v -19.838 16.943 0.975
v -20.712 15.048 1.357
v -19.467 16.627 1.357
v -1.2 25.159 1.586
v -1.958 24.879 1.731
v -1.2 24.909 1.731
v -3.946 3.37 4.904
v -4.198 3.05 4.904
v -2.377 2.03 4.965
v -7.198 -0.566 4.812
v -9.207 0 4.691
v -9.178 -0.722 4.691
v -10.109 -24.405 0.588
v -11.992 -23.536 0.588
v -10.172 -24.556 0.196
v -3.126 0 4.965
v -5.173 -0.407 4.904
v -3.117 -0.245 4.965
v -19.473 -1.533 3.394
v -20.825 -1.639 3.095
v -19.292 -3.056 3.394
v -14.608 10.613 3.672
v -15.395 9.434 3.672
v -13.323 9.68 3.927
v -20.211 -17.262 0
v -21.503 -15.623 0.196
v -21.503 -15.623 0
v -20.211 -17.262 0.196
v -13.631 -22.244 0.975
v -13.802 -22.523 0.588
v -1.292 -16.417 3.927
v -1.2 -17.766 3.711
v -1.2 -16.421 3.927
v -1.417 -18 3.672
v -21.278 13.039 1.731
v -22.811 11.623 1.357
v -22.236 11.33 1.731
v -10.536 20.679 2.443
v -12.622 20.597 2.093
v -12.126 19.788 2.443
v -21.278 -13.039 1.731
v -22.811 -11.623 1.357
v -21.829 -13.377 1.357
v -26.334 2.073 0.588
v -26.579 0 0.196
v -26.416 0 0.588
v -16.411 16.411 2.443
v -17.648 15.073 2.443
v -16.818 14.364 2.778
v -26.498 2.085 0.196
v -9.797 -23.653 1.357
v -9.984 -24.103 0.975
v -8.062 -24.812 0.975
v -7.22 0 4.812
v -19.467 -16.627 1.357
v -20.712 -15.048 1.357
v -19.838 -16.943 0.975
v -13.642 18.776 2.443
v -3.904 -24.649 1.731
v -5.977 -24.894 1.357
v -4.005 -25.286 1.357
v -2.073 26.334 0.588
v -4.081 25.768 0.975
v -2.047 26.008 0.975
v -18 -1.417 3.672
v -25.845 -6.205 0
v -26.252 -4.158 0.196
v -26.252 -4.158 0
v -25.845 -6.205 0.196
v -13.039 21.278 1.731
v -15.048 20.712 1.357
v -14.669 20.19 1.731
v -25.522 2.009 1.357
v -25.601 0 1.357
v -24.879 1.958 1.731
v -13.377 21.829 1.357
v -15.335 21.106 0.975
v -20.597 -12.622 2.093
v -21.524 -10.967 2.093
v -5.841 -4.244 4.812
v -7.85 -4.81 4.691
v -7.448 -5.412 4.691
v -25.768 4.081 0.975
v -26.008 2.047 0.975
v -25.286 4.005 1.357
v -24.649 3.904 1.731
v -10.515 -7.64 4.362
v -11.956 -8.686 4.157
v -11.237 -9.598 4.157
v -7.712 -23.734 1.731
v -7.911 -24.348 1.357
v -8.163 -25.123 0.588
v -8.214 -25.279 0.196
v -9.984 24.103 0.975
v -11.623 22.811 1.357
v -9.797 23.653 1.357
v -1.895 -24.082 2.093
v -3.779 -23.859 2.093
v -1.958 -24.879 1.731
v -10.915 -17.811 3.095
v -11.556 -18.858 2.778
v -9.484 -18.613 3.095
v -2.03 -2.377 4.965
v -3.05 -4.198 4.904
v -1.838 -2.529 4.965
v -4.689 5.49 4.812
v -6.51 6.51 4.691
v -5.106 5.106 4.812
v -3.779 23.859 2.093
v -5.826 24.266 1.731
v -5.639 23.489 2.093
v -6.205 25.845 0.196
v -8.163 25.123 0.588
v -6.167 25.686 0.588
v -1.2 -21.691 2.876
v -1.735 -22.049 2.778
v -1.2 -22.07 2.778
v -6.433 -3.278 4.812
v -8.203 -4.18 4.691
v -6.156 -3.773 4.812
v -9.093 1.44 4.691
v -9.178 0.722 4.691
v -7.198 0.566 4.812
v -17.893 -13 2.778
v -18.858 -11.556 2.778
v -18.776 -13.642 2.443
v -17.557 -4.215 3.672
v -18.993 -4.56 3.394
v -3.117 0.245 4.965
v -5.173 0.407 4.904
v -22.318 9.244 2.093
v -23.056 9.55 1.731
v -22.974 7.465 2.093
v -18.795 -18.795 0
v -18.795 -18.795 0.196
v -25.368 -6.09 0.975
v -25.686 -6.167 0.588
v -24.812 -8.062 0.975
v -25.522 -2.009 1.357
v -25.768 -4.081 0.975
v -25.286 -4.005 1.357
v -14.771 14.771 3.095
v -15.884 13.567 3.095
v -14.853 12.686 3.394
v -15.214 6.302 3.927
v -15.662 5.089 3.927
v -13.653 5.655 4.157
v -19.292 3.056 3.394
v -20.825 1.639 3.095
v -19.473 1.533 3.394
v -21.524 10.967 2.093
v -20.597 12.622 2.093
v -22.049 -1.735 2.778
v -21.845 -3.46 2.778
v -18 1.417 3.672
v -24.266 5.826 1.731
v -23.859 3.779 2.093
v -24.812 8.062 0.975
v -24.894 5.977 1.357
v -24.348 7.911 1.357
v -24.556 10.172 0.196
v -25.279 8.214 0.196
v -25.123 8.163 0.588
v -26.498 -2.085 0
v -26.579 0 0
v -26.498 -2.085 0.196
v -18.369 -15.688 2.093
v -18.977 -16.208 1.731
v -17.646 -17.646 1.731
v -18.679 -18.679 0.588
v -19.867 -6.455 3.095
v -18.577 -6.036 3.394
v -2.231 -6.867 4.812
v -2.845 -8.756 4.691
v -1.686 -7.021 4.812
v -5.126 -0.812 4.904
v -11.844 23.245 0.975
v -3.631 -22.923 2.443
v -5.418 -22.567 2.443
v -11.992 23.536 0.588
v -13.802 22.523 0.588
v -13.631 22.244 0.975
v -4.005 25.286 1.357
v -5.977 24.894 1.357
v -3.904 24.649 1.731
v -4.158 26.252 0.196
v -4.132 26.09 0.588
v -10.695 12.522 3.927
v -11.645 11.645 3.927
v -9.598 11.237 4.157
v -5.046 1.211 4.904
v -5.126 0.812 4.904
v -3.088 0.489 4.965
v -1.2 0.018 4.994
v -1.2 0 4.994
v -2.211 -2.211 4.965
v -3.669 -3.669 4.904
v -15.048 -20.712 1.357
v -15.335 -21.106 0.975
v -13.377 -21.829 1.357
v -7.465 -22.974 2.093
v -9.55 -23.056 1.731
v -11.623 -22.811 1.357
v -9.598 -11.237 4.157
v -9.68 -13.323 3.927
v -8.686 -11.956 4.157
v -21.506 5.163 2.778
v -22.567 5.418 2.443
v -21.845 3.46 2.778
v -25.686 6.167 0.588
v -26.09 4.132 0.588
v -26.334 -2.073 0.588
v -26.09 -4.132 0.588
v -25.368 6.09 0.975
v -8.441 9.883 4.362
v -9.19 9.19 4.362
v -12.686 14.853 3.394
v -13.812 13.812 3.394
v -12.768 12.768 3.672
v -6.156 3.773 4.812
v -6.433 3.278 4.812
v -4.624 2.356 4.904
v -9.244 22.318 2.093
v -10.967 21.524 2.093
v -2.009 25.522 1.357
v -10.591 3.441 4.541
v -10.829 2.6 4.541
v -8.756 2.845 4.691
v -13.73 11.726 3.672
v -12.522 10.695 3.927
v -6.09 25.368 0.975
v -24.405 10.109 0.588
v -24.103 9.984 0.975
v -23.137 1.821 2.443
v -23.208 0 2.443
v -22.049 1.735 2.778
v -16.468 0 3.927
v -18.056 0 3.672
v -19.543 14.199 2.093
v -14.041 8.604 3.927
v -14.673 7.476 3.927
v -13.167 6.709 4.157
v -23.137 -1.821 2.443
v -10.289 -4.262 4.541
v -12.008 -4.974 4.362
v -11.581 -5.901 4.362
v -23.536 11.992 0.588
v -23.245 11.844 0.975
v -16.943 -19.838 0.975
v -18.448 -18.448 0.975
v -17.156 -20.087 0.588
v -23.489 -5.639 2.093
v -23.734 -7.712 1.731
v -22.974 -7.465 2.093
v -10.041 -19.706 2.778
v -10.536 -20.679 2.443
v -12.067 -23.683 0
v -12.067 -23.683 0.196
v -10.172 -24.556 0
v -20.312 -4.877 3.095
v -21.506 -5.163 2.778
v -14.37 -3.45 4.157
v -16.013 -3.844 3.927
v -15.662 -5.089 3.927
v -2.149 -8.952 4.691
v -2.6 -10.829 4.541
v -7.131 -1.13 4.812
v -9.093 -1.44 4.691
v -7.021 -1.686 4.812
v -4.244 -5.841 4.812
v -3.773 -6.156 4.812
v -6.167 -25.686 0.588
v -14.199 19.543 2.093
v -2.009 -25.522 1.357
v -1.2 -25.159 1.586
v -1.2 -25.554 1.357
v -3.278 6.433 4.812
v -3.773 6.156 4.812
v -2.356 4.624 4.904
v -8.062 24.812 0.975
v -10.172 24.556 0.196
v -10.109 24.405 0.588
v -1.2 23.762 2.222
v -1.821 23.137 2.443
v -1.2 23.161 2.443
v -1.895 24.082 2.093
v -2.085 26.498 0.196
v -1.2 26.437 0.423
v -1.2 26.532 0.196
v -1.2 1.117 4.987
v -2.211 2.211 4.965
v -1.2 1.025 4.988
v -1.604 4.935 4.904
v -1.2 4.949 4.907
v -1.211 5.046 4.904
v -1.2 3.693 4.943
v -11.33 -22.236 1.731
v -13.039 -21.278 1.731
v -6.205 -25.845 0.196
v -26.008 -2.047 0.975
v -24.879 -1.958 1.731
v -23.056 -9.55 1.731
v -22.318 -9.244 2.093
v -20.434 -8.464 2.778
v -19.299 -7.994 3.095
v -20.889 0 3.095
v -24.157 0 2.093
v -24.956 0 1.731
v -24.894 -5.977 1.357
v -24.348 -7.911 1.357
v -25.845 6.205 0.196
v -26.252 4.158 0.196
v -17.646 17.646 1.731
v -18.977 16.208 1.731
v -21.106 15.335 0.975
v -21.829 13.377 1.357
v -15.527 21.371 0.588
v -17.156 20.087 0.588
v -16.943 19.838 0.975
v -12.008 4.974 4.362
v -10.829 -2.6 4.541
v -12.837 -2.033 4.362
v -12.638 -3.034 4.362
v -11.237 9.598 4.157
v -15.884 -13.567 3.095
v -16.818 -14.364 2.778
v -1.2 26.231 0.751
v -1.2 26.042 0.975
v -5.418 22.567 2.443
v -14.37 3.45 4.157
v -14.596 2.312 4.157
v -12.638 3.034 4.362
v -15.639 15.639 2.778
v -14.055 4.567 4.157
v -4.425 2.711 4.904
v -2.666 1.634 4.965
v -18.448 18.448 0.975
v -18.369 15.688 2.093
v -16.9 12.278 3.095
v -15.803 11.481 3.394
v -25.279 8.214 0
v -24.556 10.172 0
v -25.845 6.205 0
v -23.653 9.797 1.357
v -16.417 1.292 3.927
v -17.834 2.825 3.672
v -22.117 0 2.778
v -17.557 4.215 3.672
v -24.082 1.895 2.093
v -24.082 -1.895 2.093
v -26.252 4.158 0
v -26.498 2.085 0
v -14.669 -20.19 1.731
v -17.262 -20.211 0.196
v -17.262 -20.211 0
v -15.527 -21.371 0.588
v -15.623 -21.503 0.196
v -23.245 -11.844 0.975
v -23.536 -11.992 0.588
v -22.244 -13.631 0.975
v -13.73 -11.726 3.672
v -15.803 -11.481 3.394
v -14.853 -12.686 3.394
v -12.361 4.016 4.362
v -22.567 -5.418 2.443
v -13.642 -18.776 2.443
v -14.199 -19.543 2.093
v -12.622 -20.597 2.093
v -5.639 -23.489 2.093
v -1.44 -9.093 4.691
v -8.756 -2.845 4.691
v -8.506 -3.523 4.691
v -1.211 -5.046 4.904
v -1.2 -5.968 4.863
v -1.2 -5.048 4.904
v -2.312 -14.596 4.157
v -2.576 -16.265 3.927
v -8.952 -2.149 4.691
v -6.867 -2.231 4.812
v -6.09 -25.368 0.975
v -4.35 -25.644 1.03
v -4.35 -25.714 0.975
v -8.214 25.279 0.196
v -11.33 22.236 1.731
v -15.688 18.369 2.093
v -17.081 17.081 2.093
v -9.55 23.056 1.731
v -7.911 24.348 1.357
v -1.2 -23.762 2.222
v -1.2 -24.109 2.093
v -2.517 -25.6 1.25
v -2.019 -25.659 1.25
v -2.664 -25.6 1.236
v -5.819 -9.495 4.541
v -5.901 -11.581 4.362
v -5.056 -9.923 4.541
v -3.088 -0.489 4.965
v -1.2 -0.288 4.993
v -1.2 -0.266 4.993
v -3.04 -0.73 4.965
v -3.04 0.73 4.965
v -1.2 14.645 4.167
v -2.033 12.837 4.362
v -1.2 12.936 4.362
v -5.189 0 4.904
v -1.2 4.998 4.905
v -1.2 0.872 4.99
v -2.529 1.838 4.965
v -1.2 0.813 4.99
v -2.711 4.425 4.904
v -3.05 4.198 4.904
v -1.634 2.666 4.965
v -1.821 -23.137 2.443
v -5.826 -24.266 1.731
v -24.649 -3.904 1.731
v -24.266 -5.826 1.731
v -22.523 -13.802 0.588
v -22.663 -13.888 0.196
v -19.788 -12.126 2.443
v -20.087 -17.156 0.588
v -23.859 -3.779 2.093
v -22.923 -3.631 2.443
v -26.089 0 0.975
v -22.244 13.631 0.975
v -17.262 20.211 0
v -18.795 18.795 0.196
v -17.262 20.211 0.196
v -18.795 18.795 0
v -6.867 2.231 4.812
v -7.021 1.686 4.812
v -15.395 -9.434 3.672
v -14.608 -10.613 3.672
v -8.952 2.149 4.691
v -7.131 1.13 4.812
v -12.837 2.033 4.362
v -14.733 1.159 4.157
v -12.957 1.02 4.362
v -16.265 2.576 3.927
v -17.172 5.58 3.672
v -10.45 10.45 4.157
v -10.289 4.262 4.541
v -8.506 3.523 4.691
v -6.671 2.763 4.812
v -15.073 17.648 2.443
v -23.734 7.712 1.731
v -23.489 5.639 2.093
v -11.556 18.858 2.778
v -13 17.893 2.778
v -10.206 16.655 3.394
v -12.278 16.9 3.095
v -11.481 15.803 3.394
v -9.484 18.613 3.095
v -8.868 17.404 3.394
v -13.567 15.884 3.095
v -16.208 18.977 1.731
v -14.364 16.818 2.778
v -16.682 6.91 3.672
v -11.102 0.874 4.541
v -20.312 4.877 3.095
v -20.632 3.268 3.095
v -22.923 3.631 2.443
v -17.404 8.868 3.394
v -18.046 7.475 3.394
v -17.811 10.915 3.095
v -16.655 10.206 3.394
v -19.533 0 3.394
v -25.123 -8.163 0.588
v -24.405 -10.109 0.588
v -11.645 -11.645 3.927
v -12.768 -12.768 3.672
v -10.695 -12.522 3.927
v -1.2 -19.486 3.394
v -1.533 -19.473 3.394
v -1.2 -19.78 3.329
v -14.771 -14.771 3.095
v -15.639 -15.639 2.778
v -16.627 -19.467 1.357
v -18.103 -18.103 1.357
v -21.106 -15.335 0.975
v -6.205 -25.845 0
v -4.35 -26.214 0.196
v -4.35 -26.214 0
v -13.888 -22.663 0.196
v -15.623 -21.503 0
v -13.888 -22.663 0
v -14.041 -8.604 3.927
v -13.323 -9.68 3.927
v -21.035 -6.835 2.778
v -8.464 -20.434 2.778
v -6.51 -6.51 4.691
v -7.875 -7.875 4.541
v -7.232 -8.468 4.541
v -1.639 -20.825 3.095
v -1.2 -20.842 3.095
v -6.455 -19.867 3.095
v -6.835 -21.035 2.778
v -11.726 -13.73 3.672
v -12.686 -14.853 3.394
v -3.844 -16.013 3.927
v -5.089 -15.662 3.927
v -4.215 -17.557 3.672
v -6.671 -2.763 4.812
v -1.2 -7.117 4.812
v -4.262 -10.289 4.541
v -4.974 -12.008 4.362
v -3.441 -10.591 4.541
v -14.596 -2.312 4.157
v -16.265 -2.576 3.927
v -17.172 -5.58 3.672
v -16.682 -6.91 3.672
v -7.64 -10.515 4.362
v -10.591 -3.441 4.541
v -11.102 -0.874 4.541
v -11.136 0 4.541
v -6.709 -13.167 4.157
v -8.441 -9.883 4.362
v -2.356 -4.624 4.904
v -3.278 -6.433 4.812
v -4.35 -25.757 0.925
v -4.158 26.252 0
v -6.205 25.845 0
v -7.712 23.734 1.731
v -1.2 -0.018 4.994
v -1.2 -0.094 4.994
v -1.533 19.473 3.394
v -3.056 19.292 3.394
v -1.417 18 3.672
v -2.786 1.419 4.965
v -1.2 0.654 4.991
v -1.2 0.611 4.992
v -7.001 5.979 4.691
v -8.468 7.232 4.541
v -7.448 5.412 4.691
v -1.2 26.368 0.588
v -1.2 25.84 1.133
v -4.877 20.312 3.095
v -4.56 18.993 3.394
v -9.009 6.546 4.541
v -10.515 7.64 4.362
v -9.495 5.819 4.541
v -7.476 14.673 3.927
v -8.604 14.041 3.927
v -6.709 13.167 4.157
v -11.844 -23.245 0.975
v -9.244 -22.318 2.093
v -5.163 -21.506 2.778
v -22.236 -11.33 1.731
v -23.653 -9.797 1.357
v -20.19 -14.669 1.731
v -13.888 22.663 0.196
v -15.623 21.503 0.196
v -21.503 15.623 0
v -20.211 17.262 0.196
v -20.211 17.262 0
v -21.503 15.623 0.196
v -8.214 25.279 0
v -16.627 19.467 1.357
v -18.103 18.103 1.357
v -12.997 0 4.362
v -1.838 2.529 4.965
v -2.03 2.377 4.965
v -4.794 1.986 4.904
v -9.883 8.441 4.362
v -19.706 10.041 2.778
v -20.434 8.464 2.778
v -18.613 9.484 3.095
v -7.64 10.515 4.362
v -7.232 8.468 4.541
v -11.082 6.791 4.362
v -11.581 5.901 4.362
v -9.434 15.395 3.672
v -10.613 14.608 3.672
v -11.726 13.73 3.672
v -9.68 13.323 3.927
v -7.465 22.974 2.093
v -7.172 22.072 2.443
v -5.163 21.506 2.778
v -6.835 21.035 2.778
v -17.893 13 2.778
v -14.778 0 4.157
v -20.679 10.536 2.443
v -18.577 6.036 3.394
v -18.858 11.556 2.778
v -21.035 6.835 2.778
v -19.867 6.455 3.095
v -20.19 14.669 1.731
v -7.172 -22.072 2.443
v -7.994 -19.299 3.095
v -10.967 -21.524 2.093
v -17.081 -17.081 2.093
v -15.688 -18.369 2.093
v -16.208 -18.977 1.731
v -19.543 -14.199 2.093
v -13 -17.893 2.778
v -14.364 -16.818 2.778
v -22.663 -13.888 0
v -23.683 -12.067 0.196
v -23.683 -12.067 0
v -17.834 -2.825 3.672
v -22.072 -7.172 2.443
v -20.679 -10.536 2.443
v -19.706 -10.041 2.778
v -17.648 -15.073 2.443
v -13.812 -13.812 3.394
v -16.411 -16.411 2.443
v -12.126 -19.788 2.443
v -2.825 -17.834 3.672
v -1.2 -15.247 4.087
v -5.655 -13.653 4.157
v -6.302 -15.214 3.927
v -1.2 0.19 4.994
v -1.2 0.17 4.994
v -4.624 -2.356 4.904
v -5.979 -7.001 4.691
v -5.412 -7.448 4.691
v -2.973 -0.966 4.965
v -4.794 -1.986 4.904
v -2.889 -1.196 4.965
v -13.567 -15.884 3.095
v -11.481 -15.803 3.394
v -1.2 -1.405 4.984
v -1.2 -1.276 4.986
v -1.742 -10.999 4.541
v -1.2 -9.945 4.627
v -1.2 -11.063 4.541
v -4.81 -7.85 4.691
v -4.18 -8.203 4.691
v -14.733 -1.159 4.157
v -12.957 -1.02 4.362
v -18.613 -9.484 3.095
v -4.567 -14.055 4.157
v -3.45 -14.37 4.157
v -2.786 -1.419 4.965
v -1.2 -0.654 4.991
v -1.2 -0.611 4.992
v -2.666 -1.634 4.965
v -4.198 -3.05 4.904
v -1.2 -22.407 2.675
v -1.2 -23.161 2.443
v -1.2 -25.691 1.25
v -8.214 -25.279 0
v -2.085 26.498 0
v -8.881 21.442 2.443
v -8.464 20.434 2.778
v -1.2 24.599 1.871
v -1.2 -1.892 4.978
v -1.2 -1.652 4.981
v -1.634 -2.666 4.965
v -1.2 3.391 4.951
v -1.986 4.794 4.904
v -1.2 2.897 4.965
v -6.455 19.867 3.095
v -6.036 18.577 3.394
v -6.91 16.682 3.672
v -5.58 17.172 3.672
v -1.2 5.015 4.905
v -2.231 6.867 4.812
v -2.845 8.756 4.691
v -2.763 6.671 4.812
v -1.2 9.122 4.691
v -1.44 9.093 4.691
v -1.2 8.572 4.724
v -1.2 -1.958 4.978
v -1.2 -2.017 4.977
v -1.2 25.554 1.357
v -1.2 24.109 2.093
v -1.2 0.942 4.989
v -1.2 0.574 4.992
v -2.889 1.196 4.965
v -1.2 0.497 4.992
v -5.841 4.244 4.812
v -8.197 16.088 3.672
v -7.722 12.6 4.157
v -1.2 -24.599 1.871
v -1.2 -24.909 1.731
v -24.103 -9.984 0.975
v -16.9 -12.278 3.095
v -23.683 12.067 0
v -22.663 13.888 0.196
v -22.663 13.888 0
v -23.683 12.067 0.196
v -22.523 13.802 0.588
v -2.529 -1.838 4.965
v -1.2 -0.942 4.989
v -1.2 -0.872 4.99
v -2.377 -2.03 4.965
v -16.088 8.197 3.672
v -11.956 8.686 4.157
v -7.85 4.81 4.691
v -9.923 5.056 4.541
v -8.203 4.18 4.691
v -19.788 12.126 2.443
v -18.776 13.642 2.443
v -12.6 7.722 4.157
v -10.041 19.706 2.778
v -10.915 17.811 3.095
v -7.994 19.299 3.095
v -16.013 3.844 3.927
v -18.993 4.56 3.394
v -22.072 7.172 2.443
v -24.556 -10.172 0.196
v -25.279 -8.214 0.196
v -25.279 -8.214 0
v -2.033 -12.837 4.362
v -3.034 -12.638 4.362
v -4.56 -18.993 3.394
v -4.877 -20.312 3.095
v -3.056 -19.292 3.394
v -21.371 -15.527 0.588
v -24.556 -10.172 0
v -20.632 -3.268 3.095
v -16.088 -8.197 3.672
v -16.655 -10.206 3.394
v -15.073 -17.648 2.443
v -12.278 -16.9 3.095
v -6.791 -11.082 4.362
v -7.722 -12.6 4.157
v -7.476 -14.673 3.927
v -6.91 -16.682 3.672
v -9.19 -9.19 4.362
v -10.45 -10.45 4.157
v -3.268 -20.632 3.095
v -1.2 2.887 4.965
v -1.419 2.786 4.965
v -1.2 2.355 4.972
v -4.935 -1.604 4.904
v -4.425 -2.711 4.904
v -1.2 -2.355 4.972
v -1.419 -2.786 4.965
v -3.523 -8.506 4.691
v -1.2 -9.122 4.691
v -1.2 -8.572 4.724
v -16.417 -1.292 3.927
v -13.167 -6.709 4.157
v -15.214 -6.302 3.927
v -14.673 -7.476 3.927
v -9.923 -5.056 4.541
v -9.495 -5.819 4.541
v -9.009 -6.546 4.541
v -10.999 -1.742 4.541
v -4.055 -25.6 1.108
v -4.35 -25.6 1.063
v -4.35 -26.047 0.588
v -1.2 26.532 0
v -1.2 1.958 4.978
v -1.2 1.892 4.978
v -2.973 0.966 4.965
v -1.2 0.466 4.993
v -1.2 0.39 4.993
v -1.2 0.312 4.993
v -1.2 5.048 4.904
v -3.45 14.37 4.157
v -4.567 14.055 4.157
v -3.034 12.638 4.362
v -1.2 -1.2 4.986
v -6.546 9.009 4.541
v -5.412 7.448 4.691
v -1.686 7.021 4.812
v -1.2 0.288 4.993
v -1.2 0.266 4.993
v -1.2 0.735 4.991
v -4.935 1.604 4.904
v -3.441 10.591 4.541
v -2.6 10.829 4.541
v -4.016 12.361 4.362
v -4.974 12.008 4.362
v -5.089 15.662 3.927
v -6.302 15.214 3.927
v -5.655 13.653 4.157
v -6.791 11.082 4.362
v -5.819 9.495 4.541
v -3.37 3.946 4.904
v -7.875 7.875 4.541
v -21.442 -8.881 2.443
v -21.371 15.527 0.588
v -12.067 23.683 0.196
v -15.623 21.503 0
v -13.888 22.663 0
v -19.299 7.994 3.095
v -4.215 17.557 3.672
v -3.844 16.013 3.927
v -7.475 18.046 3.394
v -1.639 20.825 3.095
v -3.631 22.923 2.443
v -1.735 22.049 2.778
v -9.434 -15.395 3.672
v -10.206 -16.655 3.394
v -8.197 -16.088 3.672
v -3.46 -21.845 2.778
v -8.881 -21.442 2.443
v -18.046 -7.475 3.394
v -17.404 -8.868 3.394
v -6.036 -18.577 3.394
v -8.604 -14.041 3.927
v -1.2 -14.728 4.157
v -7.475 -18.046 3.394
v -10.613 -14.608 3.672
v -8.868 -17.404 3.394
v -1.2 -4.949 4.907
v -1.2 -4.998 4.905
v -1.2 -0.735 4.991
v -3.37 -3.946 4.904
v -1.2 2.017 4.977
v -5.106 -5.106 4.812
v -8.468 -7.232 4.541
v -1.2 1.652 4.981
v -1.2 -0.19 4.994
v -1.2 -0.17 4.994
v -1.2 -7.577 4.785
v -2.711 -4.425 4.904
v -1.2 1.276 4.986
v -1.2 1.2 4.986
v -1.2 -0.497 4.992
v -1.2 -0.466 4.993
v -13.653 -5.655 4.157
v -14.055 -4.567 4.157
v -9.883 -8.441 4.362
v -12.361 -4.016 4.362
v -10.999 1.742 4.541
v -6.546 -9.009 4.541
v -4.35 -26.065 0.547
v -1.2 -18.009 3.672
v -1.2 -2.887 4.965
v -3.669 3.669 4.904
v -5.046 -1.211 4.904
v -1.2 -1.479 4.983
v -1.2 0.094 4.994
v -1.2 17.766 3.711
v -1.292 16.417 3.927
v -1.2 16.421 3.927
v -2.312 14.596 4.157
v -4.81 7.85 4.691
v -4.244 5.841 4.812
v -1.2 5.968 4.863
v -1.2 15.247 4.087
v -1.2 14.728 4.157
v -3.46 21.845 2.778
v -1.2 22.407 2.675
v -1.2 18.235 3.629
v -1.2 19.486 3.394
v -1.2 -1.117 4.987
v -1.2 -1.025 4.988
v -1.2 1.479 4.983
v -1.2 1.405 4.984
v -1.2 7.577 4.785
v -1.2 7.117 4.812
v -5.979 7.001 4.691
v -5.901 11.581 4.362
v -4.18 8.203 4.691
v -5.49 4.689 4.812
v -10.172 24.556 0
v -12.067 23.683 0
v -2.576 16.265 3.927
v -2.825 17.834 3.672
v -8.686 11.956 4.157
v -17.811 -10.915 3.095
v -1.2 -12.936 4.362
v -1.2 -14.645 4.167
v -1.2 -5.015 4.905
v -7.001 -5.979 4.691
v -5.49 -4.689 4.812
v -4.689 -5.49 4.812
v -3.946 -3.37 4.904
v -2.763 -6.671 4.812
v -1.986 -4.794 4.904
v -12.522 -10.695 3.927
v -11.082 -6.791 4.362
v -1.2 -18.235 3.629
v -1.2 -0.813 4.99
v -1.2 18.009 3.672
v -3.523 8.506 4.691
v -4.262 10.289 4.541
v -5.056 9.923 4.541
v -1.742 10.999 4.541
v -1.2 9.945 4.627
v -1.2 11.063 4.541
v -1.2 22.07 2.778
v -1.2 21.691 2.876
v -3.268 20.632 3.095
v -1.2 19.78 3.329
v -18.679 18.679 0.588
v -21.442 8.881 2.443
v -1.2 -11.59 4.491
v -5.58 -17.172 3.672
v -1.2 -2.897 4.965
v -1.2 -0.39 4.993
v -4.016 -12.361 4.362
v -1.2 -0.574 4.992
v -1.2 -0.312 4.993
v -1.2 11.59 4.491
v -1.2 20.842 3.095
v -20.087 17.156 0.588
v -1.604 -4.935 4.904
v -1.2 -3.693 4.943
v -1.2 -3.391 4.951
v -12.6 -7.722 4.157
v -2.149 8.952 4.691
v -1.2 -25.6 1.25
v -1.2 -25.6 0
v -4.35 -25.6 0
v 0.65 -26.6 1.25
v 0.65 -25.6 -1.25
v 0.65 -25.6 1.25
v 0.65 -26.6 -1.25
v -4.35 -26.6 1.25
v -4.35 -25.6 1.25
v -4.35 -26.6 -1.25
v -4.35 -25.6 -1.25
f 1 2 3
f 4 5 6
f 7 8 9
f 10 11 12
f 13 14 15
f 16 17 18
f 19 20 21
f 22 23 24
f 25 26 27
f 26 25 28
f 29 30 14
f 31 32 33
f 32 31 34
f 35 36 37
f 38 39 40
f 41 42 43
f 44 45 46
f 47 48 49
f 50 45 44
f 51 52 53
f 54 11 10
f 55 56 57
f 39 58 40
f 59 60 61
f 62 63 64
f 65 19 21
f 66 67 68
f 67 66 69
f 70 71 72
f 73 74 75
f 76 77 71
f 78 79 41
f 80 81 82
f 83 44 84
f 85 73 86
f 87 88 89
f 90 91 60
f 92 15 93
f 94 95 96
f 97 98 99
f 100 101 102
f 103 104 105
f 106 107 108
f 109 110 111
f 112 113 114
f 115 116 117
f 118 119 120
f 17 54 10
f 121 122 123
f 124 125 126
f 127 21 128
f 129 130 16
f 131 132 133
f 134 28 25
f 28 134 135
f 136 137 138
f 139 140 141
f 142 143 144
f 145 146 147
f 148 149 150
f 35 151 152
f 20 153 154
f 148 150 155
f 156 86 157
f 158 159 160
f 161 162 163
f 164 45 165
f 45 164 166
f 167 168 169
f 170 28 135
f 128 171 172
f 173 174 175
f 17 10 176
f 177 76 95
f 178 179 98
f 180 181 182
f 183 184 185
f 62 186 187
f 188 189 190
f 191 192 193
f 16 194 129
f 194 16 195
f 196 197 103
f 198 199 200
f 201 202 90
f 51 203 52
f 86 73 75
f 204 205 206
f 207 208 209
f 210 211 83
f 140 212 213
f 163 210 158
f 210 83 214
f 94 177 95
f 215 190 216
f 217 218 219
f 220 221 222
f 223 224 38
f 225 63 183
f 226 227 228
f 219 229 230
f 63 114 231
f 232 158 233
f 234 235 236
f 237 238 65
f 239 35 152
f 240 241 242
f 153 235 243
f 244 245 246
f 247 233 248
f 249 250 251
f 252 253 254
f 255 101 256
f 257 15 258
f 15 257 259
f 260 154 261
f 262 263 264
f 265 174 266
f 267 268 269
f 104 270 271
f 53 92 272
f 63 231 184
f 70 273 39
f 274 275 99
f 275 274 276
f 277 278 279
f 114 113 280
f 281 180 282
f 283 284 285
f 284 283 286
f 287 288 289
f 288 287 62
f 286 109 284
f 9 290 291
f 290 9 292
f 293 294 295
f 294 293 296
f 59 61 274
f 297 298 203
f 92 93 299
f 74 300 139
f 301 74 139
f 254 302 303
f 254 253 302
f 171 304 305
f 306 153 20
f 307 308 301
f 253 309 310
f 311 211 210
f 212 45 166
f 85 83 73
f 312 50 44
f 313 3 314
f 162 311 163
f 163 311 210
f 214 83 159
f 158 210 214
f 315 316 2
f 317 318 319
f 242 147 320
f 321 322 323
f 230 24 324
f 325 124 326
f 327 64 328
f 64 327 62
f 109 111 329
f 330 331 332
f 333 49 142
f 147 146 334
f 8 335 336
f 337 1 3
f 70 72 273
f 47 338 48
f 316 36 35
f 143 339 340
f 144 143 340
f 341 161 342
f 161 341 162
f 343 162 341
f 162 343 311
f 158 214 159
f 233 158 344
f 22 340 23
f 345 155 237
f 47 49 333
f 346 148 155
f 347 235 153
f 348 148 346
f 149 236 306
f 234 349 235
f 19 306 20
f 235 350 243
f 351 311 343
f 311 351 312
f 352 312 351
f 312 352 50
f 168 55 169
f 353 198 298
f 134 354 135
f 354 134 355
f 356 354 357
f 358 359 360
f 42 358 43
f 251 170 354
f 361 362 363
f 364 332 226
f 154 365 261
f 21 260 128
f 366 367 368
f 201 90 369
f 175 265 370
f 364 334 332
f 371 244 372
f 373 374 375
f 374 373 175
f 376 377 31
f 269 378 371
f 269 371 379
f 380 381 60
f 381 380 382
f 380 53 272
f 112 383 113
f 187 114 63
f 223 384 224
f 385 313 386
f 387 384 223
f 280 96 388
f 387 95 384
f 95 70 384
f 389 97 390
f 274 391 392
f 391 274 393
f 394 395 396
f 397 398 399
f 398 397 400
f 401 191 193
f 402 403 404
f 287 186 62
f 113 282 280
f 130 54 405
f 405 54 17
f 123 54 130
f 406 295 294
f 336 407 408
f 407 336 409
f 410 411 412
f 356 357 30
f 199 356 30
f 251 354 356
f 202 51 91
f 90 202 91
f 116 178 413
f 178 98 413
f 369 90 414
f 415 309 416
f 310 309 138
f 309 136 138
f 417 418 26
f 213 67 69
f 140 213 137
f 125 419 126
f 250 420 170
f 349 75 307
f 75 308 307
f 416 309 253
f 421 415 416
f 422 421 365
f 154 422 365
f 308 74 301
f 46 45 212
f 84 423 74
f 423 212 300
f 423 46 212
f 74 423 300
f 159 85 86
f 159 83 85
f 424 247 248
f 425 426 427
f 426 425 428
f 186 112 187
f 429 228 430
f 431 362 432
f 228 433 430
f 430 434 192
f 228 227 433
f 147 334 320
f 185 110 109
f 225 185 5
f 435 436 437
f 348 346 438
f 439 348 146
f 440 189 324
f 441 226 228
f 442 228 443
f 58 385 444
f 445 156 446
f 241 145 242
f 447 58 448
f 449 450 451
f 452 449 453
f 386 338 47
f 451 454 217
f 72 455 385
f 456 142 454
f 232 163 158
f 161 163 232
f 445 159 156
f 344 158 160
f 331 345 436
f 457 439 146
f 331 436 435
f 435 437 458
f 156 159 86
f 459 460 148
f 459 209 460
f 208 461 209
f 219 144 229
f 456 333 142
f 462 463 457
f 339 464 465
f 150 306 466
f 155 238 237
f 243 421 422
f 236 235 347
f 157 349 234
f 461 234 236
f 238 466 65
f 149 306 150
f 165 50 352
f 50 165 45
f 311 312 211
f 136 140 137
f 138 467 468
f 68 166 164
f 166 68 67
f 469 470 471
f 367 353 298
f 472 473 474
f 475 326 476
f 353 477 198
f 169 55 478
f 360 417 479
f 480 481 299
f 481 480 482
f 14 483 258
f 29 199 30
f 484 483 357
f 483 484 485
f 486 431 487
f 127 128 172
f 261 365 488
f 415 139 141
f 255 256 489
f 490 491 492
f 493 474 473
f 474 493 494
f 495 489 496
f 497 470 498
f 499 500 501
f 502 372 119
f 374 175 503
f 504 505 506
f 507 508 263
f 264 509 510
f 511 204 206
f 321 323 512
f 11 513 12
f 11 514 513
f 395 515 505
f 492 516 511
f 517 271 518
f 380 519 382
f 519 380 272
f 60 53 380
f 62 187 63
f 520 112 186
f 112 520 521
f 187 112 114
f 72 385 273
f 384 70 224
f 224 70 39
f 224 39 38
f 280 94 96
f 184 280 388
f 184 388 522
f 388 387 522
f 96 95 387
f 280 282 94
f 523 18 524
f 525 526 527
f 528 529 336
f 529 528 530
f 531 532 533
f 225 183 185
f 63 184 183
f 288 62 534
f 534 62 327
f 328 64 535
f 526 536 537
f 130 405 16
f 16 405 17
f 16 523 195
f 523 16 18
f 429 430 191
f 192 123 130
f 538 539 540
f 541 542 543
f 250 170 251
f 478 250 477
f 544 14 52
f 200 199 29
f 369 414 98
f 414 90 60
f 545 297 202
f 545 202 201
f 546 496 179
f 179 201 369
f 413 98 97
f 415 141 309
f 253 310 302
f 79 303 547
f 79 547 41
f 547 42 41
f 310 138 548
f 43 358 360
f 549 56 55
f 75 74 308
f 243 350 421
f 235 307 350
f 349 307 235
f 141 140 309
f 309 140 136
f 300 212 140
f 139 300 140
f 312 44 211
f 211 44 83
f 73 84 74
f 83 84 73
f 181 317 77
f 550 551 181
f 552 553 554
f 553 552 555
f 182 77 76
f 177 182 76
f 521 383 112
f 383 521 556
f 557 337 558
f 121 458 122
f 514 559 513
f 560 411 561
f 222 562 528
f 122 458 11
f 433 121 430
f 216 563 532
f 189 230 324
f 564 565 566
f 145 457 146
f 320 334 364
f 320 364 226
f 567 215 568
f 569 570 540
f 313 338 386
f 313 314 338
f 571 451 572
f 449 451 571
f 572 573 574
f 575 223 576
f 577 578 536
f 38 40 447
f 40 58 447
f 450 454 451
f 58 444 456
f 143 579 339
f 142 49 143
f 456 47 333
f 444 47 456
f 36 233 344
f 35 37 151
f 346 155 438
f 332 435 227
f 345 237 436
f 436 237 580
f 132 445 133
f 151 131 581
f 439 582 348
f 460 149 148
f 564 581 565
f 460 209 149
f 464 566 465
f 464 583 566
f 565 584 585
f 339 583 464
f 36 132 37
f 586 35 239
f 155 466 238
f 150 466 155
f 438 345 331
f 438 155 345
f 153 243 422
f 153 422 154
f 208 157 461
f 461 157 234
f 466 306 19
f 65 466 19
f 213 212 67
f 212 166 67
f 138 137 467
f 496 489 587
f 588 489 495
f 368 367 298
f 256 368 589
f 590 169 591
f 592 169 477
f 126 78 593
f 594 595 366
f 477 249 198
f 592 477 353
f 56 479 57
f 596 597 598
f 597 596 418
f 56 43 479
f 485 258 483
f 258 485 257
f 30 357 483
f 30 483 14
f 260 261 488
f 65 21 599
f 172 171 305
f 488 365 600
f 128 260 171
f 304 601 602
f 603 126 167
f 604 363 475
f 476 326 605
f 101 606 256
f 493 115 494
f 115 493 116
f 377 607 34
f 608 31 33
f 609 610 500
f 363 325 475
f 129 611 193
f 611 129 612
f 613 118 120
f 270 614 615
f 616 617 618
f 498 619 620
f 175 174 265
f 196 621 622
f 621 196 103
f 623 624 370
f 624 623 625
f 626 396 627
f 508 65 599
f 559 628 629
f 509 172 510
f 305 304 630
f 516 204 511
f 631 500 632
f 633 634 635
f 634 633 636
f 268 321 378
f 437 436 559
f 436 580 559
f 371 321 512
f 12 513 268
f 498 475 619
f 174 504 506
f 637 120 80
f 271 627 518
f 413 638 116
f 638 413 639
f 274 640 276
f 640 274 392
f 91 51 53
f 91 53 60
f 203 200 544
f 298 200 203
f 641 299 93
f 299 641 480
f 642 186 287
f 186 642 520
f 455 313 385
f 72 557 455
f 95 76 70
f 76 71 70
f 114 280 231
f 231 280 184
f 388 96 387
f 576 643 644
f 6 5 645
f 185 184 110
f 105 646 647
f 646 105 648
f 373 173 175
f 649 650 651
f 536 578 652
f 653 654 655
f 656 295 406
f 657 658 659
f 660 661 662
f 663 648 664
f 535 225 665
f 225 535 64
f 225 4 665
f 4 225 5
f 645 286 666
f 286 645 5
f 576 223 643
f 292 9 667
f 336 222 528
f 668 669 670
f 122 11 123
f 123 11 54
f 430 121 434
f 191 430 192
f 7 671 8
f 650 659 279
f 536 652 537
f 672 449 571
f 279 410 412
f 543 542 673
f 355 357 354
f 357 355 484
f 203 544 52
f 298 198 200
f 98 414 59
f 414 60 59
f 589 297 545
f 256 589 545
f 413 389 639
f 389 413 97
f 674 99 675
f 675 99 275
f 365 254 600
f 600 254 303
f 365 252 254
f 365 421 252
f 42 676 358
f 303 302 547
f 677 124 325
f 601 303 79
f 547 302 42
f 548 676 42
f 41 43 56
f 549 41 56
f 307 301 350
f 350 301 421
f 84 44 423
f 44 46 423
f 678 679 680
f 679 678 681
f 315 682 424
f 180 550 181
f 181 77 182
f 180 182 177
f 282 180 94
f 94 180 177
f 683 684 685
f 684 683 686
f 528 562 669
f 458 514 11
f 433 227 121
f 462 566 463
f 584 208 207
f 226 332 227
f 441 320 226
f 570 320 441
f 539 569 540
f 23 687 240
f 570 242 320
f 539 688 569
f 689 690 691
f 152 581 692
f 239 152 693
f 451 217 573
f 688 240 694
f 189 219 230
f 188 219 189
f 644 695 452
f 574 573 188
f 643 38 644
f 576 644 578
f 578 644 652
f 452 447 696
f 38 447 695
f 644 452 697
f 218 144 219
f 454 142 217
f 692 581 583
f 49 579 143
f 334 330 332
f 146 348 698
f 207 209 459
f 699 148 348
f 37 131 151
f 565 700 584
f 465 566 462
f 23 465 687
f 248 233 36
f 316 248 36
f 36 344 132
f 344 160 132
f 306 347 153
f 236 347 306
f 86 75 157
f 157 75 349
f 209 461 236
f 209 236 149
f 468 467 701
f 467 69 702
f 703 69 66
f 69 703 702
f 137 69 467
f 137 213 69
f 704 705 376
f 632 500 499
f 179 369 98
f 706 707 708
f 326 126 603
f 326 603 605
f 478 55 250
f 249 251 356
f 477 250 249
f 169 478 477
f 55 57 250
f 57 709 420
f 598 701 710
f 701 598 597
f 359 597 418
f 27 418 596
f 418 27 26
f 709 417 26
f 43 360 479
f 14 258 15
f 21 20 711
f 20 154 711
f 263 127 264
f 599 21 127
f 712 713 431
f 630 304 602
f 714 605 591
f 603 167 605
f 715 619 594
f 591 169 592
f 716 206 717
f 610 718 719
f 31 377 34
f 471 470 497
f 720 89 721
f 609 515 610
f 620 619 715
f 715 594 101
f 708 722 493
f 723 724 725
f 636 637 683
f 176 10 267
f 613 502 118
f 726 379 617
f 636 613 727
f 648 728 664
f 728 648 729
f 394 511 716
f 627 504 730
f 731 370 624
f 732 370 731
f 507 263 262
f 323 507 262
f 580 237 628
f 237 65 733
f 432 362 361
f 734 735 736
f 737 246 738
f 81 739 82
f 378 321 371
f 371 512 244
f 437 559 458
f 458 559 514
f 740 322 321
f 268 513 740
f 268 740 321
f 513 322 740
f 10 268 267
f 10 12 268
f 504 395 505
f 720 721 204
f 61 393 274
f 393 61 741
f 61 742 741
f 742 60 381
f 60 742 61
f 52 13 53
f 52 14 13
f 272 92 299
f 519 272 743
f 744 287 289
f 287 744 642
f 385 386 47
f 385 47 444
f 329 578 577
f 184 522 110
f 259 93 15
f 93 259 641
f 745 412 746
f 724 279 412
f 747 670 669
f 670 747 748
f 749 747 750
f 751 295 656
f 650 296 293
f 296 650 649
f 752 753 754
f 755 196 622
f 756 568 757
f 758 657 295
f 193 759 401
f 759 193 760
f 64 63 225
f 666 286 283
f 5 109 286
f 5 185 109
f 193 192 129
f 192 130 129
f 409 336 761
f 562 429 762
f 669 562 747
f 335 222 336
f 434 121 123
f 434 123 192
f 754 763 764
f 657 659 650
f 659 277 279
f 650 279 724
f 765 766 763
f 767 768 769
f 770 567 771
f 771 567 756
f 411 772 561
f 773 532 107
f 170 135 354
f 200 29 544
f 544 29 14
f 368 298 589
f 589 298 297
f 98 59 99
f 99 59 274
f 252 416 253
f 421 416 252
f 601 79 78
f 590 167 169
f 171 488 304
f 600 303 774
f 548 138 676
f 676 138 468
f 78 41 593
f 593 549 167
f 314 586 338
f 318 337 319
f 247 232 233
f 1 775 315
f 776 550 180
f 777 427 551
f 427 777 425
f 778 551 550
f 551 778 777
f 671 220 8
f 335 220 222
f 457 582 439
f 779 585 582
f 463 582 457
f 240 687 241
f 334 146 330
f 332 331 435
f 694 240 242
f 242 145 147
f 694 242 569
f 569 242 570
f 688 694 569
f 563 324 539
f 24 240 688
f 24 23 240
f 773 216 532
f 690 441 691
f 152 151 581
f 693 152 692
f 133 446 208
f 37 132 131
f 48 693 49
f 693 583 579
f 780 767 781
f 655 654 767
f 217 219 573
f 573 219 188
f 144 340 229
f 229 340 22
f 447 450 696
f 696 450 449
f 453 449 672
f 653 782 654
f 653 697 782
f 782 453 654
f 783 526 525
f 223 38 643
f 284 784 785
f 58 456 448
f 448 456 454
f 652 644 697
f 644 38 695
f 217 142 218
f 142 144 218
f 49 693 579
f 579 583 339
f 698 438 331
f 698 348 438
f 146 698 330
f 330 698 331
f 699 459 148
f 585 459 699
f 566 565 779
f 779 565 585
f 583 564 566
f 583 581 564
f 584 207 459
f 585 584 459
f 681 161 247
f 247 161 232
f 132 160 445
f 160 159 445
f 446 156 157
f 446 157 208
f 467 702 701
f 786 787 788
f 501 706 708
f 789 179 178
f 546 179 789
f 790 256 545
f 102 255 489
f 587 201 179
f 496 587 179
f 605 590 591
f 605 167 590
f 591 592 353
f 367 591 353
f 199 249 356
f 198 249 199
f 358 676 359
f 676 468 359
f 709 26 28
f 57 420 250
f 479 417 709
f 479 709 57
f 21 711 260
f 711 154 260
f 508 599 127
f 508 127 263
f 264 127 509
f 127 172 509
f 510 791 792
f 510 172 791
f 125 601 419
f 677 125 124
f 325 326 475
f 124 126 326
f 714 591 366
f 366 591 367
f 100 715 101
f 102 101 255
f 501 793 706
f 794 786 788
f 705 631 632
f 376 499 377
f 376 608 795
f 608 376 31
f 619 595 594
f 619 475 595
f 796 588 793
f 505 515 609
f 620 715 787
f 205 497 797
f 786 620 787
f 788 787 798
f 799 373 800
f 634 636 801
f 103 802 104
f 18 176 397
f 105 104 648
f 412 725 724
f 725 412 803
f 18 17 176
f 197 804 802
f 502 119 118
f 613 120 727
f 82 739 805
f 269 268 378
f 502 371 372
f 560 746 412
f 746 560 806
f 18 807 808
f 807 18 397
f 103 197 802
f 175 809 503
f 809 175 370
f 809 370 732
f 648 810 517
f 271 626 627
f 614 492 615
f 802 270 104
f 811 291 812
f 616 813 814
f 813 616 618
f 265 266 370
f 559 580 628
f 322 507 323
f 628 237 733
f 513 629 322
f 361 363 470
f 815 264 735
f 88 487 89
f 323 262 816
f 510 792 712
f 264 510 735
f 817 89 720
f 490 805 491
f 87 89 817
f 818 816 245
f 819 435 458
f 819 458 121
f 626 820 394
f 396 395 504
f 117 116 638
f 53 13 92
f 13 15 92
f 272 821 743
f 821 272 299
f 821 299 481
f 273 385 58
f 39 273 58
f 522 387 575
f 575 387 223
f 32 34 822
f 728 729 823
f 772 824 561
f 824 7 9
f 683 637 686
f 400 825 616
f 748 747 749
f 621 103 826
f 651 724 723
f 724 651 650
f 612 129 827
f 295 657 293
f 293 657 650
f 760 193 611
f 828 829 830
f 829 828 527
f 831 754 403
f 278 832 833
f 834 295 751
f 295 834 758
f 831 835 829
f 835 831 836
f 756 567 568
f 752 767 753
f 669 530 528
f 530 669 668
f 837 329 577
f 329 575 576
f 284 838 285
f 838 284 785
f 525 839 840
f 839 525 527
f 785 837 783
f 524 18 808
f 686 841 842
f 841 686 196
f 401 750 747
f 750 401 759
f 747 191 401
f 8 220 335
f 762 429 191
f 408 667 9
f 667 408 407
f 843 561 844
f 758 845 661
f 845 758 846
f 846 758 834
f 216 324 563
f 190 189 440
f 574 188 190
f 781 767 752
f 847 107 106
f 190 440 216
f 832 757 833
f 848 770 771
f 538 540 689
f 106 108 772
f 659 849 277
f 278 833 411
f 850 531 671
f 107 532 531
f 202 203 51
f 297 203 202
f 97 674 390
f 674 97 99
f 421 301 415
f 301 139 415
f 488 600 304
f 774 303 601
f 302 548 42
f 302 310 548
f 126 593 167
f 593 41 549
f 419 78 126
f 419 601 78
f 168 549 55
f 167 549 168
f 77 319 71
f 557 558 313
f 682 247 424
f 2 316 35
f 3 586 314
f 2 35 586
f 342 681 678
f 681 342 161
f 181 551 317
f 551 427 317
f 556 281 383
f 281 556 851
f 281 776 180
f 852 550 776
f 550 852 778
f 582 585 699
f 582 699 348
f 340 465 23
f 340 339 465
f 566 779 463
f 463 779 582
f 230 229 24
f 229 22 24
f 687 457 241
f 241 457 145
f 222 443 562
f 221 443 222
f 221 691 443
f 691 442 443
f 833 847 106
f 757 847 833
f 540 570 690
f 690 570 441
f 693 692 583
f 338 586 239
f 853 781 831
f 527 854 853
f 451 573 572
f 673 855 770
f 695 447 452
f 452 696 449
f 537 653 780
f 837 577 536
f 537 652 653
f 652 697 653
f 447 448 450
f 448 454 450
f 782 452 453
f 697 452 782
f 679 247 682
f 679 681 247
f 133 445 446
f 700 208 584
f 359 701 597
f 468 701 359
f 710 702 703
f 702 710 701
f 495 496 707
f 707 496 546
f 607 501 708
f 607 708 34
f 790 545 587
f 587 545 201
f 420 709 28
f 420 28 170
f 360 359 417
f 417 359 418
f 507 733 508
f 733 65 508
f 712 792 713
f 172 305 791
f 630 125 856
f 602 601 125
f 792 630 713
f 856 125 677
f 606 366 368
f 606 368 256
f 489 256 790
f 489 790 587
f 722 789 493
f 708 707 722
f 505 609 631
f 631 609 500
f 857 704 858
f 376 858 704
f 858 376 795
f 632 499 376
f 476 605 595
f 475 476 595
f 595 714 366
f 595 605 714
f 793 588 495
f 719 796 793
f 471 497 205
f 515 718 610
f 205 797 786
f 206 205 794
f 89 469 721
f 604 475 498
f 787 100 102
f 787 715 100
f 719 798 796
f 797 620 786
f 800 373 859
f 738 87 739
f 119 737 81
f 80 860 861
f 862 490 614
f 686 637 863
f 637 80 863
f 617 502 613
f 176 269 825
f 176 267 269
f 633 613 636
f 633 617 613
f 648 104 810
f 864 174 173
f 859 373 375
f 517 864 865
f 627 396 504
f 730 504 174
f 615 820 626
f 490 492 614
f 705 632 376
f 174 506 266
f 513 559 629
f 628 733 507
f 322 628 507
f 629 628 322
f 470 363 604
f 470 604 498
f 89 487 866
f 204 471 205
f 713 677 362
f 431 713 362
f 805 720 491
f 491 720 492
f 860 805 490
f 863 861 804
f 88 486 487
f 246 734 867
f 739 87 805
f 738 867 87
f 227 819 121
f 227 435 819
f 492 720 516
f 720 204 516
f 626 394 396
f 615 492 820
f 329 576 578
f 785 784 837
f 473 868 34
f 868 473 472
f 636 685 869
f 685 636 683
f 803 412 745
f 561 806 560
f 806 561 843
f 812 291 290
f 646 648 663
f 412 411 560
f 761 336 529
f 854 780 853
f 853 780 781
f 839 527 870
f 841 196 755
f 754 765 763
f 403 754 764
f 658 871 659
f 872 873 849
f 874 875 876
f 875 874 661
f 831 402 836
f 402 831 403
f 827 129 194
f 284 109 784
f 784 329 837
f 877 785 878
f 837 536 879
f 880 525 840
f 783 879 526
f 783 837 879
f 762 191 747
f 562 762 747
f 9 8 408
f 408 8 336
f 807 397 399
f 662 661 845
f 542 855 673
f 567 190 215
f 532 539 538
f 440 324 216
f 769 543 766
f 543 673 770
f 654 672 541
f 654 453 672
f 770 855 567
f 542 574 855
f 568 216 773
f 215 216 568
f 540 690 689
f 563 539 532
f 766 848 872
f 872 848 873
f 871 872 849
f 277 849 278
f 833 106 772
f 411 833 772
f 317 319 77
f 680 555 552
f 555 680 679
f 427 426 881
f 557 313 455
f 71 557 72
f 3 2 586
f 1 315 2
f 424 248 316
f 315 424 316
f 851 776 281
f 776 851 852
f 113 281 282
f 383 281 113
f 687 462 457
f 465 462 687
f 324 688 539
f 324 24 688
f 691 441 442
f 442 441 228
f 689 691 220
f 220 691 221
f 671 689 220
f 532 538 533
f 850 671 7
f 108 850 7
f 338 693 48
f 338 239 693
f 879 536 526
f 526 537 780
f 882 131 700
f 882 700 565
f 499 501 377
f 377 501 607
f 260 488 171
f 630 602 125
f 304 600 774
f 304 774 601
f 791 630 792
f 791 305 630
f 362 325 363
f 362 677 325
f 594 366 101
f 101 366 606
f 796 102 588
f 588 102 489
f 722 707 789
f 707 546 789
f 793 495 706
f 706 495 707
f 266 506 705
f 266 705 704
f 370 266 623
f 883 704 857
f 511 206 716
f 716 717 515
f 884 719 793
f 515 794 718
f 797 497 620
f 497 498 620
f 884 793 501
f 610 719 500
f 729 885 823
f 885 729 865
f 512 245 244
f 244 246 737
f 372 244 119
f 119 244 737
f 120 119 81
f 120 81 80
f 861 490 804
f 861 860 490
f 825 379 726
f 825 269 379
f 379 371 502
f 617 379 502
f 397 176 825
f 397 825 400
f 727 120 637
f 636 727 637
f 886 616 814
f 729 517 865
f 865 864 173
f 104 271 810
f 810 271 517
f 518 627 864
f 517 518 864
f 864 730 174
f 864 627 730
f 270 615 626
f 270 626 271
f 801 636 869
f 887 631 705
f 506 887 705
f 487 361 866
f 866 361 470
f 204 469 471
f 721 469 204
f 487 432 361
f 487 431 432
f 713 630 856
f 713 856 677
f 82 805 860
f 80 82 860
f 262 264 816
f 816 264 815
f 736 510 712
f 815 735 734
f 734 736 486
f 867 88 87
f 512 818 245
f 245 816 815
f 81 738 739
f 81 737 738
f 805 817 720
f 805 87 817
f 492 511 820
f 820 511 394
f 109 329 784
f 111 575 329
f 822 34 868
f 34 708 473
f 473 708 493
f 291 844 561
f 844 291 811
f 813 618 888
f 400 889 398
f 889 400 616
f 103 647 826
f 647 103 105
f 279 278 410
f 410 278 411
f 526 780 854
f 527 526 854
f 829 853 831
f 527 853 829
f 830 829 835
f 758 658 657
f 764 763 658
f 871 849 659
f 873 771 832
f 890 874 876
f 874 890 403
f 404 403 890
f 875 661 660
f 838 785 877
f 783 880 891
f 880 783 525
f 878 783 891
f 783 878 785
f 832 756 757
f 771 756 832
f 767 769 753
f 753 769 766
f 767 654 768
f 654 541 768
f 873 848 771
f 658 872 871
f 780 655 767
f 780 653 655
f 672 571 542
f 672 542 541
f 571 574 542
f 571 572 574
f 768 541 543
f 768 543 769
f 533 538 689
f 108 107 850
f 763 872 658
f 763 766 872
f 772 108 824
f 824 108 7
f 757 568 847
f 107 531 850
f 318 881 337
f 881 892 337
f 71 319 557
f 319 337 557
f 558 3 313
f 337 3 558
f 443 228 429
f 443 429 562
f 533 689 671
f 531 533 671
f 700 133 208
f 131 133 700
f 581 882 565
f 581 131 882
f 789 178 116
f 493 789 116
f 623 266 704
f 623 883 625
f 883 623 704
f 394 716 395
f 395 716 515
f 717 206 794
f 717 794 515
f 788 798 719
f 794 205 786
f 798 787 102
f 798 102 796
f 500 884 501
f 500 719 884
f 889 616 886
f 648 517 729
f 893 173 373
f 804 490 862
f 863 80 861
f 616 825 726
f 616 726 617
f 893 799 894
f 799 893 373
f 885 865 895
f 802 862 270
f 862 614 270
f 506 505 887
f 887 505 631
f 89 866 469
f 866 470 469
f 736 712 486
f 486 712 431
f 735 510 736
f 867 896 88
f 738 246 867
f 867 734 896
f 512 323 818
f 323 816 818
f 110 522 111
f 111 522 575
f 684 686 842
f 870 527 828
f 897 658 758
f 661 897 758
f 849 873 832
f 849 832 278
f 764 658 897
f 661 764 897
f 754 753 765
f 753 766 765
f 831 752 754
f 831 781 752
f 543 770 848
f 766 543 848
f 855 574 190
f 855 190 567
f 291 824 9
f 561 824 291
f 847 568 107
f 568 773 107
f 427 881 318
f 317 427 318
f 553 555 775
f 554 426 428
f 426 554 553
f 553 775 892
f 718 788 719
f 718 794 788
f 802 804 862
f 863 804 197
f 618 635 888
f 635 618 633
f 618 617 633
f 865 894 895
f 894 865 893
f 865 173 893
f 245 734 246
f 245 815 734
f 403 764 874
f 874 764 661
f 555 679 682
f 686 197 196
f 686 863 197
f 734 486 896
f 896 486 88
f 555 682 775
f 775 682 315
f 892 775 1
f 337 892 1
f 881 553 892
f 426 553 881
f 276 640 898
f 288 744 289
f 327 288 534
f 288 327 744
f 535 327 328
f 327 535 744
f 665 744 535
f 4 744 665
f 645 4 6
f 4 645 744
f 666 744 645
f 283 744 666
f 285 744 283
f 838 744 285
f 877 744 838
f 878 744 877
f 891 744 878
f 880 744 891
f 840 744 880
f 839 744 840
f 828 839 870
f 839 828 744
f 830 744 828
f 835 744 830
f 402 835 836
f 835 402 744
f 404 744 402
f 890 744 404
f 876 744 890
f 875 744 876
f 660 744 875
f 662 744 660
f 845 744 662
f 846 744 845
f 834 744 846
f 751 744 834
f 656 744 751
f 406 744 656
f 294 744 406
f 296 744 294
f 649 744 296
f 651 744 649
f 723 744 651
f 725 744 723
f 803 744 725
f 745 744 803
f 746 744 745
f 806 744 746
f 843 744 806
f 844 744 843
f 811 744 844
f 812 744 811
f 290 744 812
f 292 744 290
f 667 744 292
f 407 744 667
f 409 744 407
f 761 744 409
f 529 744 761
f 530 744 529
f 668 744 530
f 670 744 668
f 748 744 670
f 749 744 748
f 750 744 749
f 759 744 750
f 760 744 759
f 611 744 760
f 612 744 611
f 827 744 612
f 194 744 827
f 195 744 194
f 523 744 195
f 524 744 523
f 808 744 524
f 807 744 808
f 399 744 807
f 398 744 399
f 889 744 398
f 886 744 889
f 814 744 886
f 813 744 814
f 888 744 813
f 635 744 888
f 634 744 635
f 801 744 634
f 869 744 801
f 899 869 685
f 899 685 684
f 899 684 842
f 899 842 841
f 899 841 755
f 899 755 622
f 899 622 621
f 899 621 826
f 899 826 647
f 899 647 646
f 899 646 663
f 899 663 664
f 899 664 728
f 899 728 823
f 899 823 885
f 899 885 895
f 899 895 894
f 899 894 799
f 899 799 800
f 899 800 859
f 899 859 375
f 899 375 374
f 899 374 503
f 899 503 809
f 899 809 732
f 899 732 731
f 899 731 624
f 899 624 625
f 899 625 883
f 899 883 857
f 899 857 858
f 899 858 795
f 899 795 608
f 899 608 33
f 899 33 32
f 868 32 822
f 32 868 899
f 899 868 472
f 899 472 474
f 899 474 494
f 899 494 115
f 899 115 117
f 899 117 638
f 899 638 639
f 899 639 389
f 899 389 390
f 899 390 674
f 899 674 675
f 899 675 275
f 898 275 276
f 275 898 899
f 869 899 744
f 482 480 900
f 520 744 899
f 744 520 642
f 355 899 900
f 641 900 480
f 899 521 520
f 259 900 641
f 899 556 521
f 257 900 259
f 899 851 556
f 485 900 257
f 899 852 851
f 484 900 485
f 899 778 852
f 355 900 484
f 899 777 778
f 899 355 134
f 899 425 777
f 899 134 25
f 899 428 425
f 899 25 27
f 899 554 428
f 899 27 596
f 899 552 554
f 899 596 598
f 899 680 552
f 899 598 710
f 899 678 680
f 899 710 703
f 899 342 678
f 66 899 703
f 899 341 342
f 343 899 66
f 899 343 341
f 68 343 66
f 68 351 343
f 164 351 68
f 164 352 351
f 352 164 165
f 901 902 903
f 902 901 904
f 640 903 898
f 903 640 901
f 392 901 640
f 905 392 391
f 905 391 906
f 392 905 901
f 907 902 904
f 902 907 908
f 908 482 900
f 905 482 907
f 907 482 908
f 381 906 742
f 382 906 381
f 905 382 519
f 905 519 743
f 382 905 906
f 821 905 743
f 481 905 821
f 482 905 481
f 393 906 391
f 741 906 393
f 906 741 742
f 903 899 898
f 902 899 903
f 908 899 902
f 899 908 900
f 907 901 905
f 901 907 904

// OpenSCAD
// file: params.scad
// ============================================================
// DaPao Space Mouse — Shared Parameters & Utilities
// Include this file in all part files: include <params.scad>
// ============================================================

$fn = 80;

// Tolerances
tol        = 0.3;
print_tol  = 0.15;

// --- Base Dimensions ------------------------------------------
base_od       = 100;
base_id       = 94;
base_height   = 25;
base_wall     = 3;
base_floor    = 2;

plate_thick       = 3;
plate_screw_inset = 8;

// Steel insert pockets
steel_pocket_d     = 22;
steel_pocket_depth = 8;
steel_pocket_r     = 35;
steel_pocket_count = 4;

// USB-C port
usbc_width  = 9.5;
usbc_height = 3.5;
usbc_z      = 8;

// PCB mounting
pcb_standoff_h   = 5;
pcb_standoff_d   = 5;
pcb_screw_d      = 1.8;
pcb_mount_spread = 30;

// Rubber feet
foot_d     = 10;
foot_depth = 1;

// Assembly screws
assy_screw_d     = 2.2;
assy_screw_count = 4;
assy_screw_r     = 44;

// Power switch
sw_width  = 7;
sw_height = 4;
sw_z      = 18;
sw_angle  = 180;

// --- Body Dimensions ------------------------------------------
body_od_top      = 60;
body_od_bottom   = 60;
body_od_waist    = 44;
body_height      = 55;
body_wall        = 2.5;
body_waist_pos   = 0.45;
body_resolution  = 60;

tilt_clearance   = 6;
tilt_angle_max   = 18;

// --- Side Buttons (on body) -----------------------------------
side_btn_width    = 14;
side_btn_height   = 10;
side_btn_z_frac   = 0.78;
side_btn_depth    = 2;
side_btn_travel   = 1.5;

// --- Top Frame & Half-Circle Buttons --------------------------
top_frame_height  = 4;
top_frame_wall    = 3;
top_frame_lip     = 2;
top_frame_divider = 2;

top_btn_height    = 3;
top_btn_dome      = 2;
top_btn_clearance = 0.4;
top_btn_hinge_w   = 5;
top_btn_hinge_t   = 1.0;
top_btn_plunger_d = 3;
top_btn_plunger_h = 3;

top_sw_post_d     = 5;
top_sw_post_h     = 8;
top_sw_offset_y   = 10;

// --- Joystick Module ------------------------------------------
joy_base_w  = 25;
joy_base_d  = 25;
joy_base_h  = 10;
joy_stick_d = 5;
joy_stick_h = 18;
joy_travel  = 18;

// --- Joystick Coupler -----------------------------------------
coupler_od       = 20;
coupler_id       = joy_stick_d + 0.4;
coupler_height   = 15;
coupler_flange   = 30;
coupler_flange_h = 3;


// ============================================================
//                     HELPER FUNCTIONS
// ============================================================

// Concave body radius at height fraction t (0=bottom, 1=top)
function shell_r(t) =
    let(
        r_top    = body_od_top / 2,
        r_bot    = body_od_bottom / 2,
        r_waist  = body_od_waist / 2,
        r_lin    = r_bot + (r_top - r_bot) * t,
        envelope = sin(t * 180),
        max_depth = (r_bot + r_top)/2 - r_waist
    )
    r_lin - max_depth * pow(envelope, 1.3);


// ============================================================
//                     UTILITY MODULES
// ============================================================

module rounded_rect(w, l, h, r) {
    translate([0, 0, h/2])
        hull() {
            for (x = [-1, 1], y = [-1, 1])
                translate([x*(w/2-r), y*(l/2-r), 0])
                    cylinder(r=r, h=h, center=true);
        }
}

module rounded_slot(w, h, depth) {
    r = h / 2;
    hull() {
        translate([0, -(w/2 - r), 0]) cylinder(r=r, h=depth);
        translate([0,  (w/2 - r), 0]) cylinder(r=r, h=depth);
    }
}

module half_circle(r, h, side) {
    intersection() {
        cylinder(r=r, h=h);
        if (side < 0) {
            translate([-r, -r, 0]) cube([r, 2*r, h]);
        } else {
            translate([0, -r, 0]) cube([r, 2*r, h]);
        }
    }
}
// main file
// ============================================================
// DaPao Space Mouse — Part 5: Left Top Button (v2)
// Half-circle rocker. Hinges at back (Y-), clicks at front (Y+).
// Fix: hinge tab now extends from the button body — always connected.
// Fix: plunger nub connected via a solid post through button shell.
// Print: dome-side down, no supports.
// Qty: 1
// ============================================================
include <params.scad>

module top_button_left() {
    frame_id = body_od_top - 2 * top_frame_wall;
    inner_r  = frame_id / 2;
    btn_r    = inner_r - top_btn_clearance;
    shell_h  = top_btn_height + top_btn_dome;

    // Left half: X <= -divider/2 - clearance/2
    clip_x_max = -(top_frame_divider / 2 + top_btn_clearance / 2);

    union() {
        // --- Main button half-disc ---
        intersection() {
            // Domed disc (solid — no hollowing, so it's printable and strong)
            scale([1, 1, shell_h / btn_r])
                sphere(r = btn_r);

            // Crop to left half only
            translate([-btn_r * 2, -btn_r, -shell_h])
                cube([btn_r * 2 + clip_x_max, btn_r * 2, shell_h * 2]);

            // Crop to within frame radius
            cylinder(r = btn_r, h = shell_h + 0.1);
        }

        // --- Hinge tab (back, Y-): flat tongue, firmly attached to body ---
        // Placed so its inner face is at btn_r from center (touching the frame hinge shelf)
        translate([clip_x_max / 2 - top_btn_hinge_w / 4,
                   -(btn_r - top_btn_hinge_t / 2),
                   0])
            cube([top_btn_hinge_w, top_btn_hinge_t, shell_h / 2], center = true);

        // --- Plunger post (front, Y+): solid cylinder, attached to underside ---
        // Rises from z=0 down (negative Z) to contact the switch
        translate([-inner_r / 4, top_sw_offset_y, 0])
            cylinder(d = top_btn_plunger_d, h = top_btn_plunger_h);
    }
}

top_button_left();
